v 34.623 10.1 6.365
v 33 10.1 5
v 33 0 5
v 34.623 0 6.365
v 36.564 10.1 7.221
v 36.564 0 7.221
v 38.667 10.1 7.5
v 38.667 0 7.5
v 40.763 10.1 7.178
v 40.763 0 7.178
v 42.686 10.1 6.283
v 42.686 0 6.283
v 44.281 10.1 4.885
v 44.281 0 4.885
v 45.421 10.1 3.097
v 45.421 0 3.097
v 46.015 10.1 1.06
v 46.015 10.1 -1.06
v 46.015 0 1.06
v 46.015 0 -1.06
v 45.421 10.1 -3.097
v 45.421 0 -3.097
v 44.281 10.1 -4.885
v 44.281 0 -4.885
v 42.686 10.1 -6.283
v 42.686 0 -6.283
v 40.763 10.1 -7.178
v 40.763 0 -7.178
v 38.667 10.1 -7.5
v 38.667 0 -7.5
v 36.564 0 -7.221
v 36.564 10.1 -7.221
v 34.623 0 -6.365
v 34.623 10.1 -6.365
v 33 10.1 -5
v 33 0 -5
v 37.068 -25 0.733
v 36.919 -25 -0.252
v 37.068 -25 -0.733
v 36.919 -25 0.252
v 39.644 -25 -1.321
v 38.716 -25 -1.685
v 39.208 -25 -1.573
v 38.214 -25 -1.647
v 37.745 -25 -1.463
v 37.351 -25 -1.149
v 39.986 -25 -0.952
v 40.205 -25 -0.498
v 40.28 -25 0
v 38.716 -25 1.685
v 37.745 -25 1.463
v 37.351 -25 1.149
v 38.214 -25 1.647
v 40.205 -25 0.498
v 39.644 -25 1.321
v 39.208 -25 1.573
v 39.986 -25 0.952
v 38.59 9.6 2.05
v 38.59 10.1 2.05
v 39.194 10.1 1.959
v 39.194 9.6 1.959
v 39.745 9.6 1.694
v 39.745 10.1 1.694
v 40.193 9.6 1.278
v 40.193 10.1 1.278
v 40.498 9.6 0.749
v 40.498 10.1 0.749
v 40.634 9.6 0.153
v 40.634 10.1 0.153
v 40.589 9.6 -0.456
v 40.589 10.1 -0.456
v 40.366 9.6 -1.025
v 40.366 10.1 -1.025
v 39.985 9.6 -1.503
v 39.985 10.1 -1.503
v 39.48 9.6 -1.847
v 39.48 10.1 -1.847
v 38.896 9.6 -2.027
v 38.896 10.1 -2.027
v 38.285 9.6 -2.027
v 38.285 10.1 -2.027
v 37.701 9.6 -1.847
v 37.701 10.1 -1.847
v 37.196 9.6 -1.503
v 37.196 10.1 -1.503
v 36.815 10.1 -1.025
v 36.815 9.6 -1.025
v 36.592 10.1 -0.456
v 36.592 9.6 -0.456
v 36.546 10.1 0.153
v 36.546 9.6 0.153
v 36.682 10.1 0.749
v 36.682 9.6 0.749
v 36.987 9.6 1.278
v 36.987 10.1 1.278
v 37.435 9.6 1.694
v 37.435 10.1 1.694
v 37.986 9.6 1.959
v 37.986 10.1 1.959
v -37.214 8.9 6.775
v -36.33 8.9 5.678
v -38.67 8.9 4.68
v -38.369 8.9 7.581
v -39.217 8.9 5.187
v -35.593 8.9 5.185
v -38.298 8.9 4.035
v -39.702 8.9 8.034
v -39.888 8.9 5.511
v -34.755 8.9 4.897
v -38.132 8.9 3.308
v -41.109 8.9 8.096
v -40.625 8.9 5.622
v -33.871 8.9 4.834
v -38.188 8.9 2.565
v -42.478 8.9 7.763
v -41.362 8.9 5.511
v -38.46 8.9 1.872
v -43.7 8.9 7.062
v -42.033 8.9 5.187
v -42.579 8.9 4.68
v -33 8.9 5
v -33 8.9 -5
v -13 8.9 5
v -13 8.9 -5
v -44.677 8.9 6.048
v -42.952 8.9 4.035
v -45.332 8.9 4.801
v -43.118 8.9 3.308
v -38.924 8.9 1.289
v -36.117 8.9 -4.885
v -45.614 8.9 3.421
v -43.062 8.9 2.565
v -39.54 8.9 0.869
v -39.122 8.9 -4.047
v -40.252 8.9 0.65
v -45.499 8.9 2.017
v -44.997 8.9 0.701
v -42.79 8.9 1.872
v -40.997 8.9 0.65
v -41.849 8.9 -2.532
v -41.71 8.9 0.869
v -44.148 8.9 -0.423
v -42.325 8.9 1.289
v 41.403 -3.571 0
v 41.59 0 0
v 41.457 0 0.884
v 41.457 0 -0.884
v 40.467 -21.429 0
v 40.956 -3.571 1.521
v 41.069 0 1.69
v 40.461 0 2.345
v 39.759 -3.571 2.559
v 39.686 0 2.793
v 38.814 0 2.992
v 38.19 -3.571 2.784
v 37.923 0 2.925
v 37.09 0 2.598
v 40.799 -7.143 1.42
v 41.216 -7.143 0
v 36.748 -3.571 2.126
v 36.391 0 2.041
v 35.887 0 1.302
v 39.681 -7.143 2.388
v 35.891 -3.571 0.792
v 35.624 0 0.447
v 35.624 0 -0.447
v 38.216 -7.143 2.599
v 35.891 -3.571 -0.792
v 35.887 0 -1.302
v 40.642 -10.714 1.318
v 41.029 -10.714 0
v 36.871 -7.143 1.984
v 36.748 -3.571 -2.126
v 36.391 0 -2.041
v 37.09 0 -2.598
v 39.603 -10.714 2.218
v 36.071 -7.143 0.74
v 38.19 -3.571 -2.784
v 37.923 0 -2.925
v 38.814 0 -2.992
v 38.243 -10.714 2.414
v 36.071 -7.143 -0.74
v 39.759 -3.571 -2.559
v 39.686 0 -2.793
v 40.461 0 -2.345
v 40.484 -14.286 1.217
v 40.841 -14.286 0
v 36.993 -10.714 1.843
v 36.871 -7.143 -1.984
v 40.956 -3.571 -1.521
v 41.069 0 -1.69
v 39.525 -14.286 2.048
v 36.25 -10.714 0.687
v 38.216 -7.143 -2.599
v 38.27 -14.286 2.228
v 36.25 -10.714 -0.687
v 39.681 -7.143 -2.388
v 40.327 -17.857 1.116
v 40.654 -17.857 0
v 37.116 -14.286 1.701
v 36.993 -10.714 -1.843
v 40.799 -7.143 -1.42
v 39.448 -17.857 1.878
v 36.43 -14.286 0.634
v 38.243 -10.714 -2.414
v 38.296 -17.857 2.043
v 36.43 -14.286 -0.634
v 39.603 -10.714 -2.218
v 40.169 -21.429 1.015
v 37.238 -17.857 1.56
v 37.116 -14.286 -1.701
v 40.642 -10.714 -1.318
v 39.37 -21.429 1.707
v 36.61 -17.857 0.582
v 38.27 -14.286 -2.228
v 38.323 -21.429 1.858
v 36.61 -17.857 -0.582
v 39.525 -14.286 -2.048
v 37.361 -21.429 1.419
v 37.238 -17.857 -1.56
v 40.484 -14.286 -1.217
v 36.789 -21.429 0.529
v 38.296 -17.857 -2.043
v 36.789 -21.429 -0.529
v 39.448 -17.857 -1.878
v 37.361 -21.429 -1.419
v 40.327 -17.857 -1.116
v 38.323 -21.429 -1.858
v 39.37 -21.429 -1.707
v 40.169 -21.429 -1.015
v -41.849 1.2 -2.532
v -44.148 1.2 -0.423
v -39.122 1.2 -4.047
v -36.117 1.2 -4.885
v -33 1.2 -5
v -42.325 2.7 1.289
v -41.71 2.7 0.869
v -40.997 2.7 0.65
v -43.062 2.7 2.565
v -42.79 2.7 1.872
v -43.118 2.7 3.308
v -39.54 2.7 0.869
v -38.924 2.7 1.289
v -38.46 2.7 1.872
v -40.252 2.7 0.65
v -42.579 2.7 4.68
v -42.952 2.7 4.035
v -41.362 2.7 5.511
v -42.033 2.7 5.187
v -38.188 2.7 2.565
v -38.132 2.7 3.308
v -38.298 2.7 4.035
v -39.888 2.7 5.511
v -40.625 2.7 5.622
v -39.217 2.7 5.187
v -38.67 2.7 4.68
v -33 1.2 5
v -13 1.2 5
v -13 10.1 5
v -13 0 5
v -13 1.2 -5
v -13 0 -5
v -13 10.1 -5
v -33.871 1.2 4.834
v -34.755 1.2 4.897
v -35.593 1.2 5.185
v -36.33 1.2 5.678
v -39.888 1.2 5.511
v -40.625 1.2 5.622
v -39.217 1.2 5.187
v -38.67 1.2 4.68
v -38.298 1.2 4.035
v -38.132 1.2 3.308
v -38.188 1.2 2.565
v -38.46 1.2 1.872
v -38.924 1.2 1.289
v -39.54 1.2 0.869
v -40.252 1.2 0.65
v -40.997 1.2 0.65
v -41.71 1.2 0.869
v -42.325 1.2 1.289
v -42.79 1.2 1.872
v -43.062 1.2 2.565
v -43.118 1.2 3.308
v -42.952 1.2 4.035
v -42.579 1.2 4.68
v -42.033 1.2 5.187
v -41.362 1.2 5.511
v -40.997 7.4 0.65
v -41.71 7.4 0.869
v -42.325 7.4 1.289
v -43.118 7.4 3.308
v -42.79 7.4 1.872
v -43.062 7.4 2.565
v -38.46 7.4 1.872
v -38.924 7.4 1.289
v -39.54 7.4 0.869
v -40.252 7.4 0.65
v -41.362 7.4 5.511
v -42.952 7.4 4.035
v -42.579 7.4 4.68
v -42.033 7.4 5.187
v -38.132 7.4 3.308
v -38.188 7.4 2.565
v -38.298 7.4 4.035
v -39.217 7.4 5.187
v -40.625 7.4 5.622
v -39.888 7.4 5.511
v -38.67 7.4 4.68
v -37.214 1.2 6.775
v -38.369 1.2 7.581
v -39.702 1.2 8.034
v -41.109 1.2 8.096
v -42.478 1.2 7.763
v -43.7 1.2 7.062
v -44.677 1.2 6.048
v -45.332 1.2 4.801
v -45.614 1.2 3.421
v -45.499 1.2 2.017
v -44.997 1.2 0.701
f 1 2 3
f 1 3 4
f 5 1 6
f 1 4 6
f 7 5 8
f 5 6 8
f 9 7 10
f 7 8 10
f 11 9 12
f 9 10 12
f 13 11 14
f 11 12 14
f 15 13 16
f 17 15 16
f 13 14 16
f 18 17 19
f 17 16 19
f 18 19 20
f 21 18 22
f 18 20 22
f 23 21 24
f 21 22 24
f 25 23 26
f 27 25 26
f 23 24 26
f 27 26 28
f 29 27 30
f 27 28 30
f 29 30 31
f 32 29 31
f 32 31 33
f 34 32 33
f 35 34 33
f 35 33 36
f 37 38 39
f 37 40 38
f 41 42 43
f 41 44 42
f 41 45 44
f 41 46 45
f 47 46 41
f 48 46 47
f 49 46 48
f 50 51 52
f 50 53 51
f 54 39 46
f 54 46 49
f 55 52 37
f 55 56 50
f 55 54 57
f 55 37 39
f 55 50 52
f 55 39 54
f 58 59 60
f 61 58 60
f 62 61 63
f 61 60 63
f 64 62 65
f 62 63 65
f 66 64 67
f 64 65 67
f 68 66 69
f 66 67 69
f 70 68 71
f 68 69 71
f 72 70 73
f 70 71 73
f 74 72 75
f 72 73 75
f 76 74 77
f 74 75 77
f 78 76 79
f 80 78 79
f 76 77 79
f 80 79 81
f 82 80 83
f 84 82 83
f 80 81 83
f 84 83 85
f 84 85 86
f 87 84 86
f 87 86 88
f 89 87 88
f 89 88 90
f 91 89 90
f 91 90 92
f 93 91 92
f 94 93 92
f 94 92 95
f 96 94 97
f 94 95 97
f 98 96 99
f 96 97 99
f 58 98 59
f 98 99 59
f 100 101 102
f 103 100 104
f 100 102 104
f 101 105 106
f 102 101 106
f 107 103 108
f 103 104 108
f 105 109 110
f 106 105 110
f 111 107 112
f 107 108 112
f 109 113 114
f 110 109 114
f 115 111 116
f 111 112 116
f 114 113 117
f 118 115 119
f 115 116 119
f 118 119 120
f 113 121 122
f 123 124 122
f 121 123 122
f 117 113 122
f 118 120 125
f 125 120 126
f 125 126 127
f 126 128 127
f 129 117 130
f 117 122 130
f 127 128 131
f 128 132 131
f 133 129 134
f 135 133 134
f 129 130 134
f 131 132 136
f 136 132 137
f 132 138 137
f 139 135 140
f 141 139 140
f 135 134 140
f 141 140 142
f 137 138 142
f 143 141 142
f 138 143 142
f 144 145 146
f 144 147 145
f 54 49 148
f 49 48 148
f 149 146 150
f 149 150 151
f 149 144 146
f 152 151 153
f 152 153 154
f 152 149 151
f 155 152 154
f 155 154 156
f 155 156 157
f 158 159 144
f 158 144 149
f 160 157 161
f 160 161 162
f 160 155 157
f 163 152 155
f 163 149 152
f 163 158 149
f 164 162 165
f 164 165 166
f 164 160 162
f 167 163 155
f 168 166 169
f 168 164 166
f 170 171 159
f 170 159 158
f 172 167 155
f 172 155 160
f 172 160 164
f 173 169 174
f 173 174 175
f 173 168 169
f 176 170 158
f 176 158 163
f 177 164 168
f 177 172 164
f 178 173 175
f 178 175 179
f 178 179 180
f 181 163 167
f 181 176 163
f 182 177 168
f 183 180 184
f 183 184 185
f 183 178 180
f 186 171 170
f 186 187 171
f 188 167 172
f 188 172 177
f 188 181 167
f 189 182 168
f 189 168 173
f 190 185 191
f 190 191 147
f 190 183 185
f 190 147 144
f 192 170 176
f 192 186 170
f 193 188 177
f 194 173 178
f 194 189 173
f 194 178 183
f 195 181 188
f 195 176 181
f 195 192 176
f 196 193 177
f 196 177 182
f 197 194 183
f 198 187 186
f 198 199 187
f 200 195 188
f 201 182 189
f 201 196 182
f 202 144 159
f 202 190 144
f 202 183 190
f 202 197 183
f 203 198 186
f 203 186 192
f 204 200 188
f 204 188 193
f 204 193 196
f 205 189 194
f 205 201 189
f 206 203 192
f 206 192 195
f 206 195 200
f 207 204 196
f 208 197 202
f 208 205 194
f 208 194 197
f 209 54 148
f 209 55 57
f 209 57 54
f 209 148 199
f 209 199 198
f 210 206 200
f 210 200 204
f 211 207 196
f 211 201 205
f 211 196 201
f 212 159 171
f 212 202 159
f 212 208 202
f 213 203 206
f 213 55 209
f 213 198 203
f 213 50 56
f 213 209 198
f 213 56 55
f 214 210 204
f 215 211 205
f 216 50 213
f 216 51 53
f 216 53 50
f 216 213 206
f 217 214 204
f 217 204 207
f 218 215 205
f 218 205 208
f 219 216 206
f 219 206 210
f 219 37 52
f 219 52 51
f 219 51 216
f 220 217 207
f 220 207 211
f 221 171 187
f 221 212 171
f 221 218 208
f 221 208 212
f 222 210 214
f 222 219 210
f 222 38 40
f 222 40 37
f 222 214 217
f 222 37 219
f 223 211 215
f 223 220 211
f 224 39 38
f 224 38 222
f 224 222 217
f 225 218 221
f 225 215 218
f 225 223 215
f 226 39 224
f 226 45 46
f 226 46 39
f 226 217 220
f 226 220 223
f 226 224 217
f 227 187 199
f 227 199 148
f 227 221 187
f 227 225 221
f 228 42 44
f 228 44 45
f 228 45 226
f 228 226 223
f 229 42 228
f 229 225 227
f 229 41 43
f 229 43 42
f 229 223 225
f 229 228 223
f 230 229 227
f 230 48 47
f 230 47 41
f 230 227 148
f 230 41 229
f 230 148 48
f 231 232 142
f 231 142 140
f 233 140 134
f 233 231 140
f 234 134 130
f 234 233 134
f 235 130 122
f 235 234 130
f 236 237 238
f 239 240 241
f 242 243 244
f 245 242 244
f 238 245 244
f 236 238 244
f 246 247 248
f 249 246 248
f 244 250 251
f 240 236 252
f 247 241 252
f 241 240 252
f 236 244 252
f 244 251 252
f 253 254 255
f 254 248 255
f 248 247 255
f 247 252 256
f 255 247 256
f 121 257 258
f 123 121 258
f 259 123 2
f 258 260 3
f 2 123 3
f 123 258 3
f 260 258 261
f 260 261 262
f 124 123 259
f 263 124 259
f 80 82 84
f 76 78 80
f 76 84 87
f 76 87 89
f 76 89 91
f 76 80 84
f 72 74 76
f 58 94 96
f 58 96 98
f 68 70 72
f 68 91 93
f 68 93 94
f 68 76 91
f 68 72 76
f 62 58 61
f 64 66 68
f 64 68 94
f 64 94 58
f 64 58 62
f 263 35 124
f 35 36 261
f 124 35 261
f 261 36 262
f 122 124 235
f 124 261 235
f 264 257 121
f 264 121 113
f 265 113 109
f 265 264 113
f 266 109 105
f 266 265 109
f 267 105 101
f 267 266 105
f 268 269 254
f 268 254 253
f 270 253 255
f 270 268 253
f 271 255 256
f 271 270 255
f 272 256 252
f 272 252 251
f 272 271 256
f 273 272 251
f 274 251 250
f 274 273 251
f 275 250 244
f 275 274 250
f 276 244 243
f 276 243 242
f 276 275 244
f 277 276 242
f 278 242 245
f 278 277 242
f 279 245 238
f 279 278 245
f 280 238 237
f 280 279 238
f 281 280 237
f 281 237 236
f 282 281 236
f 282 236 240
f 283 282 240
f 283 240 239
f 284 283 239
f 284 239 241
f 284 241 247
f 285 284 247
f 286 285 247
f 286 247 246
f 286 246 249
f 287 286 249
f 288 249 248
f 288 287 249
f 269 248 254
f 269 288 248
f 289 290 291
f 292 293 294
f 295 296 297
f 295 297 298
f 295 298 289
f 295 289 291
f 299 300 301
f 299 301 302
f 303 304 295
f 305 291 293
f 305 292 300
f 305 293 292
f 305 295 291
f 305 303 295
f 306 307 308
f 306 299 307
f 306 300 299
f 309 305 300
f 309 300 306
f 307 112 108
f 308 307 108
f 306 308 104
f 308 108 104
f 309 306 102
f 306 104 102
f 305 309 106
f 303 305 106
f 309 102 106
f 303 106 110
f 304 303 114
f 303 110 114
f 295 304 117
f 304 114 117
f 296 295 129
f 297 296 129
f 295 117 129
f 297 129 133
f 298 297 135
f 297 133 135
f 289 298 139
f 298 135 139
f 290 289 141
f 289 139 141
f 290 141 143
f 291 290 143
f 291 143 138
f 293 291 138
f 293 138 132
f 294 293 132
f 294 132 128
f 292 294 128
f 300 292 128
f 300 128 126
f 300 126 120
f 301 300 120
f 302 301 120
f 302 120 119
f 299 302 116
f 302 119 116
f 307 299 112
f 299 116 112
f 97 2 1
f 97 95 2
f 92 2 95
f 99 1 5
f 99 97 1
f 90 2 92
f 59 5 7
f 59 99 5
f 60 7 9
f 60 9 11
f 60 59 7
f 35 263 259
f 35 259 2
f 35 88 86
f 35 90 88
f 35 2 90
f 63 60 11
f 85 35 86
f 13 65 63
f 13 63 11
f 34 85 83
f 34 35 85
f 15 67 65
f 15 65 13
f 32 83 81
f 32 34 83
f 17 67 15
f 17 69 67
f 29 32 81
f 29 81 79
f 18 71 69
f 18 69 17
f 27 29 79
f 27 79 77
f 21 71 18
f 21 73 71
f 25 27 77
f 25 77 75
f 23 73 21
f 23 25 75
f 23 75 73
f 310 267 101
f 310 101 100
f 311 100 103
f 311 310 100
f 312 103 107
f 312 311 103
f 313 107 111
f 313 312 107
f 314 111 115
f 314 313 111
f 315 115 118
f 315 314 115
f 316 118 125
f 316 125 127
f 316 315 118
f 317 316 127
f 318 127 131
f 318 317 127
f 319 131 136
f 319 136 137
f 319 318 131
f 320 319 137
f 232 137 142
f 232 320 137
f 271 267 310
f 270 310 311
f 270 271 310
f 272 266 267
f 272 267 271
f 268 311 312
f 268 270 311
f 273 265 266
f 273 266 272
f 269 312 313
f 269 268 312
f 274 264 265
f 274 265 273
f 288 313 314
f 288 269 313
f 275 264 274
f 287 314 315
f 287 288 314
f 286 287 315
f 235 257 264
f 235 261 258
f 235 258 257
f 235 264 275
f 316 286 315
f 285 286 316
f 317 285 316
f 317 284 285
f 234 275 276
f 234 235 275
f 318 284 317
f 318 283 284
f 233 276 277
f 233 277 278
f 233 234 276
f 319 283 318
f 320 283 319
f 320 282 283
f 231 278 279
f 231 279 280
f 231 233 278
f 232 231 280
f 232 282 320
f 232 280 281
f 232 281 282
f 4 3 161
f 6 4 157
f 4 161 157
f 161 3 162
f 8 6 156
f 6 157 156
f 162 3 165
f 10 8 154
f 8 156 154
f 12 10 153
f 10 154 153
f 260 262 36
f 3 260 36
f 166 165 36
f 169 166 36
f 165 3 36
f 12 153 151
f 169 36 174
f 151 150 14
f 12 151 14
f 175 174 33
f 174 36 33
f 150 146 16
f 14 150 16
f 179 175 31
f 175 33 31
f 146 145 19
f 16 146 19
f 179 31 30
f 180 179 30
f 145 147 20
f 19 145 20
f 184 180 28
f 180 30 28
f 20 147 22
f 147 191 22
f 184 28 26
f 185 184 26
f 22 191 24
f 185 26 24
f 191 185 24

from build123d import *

# Parameters (mm, degrees)
SALIENTE_EXTRUIR1_DEPTH = 10.1
CROQUIS2_R              = 2.05
CORTAR_EXTRUIR1_DEPTH   = 0.5
CROQUIS3_W              = 20
CROQUIS3_H              = 1.2
CORTAR_EXTRUIR2_DEPTH   = 49.811512632
SALIENTE_EXTRUIR3_START = -7.7
SALIENTE_EXTRUIR3_DEPTH = 7.7
CROQUIS7_R              = 2.5
CORTAR_EXTRUIR4_DEPTH   = 1.5
CROQUIS8_R              = 3
SALIENTE_EXTRUIR4_DEPTH = 25
SALIENTE_EXTRUIR4_TAPER = 3


with BuildPart() as part:
    # Croquis1 → Saliente-Extruir1 (new body)
    with BuildSketch(Plane(origin=(0, 0, 0), x_dir=(1, 0, 0), z_dir=(0, 1, 0))):
        with BuildLine():
            Line((-33, -5), (33, -5))
            ThreePointArc((33, -5), (46.090169944, 0), (33, 5))
            Line((33, 5), (-33, 5))
            Line((-33, 5), (-33, -5))
        make_face()
    extrude(amount=SALIENTE_EXTRUIR1_DEPTH)

    # Croquis2 → Cortar-Extruir1 (cut)
    with BuildSketch(Plane(origin=(0, 10.1, 0), x_dir=(1, 0, 0), z_dir=(0, 1, 0))):
        with Locations(Location((38.590169944, 0, 0), (0, 0, 270))):
            Circle(CROQUIS2_R)
    extrude(amount=-CORTAR_EXTRUIR1_DEPTH, mode=Mode.SUBTRACT)

    # Croquis3 → Cortar-Extruir2 (cut, through all)
    with BuildSketch(Plane.XY.offset(5)):
        with Locations((-23, 9.5)):
            Rectangle(CROQUIS3_W, CROQUIS3_H)
    cortar_extruir2 = extrude(amount=-CORTAR_EXTRUIR2_DEPTH, mode=Mode.SUBTRACT)

    # Simetría1: Cortar-Extruir2 across plane
    add(cortar_extruir2.mirror(Plane.ZX.offset(5.05)), mode=Mode.SUBTRACT)

    # Croquis6 → Saliente-Extruir3 (add)
    with BuildSketch(Plane(origin=(0, 8.9, 0), x_dir=(1, 0, 0), z_dir=(0, 1, 0)).offset(SALIENTE_EXTRUIR3_START)):
        with BuildLine():
            Line((-33, 5), (-33, -5))
            ThreePointArc((-33, -5), (-34.754979339, -4.897304712), (-36.330136848, -5.677931145))
            ThreePointArc((-36.330136848, -5.677931145), (-43.699538391, -7.061851575), (-44.148390874, 0.422922724))
            ThreePointArc((-44.148390874, 0.422922724), (-39.122361815, 4.046630659), (-33, 5))
        make_face()
    extrude(amount=SALIENTE_EXTRUIR3_DEPTH)

    # Croquis7 → Cortar-Extruir4 (cut)
    with BuildSketch(Plane(origin=(0, 8.9, 0), x_dir=(1, 0, 0), z_dir=(0, 1, 0))):
        with Locations(Location((-40.624839531, -3.12162005, 0), (0, 0, 270))):
            Circle(CROQUIS7_R)
    cortar_extruir4 = extrude(amount=-CORTAR_EXTRUIR4_DEPTH, mode=Mode.SUBTRACT)

    # Simetría3: Cortar-Extruir4 across plane
    add(cortar_extruir4.mirror(Plane.ZX.offset(5.05)), mode=Mode.SUBTRACT)

    # Croquis8 → Saliente-Extruir4 (add)
    with BuildSketch(Plane.XZ):
        with Locations((38.590169944, 0)):
            Circle(CROQUIS8_R)
    extrude(amount=SALIENTE_EXTRUIR4_DEPTH, taper=SALIENTE_EXTRUIR4_TAPER)


solid = part.part
